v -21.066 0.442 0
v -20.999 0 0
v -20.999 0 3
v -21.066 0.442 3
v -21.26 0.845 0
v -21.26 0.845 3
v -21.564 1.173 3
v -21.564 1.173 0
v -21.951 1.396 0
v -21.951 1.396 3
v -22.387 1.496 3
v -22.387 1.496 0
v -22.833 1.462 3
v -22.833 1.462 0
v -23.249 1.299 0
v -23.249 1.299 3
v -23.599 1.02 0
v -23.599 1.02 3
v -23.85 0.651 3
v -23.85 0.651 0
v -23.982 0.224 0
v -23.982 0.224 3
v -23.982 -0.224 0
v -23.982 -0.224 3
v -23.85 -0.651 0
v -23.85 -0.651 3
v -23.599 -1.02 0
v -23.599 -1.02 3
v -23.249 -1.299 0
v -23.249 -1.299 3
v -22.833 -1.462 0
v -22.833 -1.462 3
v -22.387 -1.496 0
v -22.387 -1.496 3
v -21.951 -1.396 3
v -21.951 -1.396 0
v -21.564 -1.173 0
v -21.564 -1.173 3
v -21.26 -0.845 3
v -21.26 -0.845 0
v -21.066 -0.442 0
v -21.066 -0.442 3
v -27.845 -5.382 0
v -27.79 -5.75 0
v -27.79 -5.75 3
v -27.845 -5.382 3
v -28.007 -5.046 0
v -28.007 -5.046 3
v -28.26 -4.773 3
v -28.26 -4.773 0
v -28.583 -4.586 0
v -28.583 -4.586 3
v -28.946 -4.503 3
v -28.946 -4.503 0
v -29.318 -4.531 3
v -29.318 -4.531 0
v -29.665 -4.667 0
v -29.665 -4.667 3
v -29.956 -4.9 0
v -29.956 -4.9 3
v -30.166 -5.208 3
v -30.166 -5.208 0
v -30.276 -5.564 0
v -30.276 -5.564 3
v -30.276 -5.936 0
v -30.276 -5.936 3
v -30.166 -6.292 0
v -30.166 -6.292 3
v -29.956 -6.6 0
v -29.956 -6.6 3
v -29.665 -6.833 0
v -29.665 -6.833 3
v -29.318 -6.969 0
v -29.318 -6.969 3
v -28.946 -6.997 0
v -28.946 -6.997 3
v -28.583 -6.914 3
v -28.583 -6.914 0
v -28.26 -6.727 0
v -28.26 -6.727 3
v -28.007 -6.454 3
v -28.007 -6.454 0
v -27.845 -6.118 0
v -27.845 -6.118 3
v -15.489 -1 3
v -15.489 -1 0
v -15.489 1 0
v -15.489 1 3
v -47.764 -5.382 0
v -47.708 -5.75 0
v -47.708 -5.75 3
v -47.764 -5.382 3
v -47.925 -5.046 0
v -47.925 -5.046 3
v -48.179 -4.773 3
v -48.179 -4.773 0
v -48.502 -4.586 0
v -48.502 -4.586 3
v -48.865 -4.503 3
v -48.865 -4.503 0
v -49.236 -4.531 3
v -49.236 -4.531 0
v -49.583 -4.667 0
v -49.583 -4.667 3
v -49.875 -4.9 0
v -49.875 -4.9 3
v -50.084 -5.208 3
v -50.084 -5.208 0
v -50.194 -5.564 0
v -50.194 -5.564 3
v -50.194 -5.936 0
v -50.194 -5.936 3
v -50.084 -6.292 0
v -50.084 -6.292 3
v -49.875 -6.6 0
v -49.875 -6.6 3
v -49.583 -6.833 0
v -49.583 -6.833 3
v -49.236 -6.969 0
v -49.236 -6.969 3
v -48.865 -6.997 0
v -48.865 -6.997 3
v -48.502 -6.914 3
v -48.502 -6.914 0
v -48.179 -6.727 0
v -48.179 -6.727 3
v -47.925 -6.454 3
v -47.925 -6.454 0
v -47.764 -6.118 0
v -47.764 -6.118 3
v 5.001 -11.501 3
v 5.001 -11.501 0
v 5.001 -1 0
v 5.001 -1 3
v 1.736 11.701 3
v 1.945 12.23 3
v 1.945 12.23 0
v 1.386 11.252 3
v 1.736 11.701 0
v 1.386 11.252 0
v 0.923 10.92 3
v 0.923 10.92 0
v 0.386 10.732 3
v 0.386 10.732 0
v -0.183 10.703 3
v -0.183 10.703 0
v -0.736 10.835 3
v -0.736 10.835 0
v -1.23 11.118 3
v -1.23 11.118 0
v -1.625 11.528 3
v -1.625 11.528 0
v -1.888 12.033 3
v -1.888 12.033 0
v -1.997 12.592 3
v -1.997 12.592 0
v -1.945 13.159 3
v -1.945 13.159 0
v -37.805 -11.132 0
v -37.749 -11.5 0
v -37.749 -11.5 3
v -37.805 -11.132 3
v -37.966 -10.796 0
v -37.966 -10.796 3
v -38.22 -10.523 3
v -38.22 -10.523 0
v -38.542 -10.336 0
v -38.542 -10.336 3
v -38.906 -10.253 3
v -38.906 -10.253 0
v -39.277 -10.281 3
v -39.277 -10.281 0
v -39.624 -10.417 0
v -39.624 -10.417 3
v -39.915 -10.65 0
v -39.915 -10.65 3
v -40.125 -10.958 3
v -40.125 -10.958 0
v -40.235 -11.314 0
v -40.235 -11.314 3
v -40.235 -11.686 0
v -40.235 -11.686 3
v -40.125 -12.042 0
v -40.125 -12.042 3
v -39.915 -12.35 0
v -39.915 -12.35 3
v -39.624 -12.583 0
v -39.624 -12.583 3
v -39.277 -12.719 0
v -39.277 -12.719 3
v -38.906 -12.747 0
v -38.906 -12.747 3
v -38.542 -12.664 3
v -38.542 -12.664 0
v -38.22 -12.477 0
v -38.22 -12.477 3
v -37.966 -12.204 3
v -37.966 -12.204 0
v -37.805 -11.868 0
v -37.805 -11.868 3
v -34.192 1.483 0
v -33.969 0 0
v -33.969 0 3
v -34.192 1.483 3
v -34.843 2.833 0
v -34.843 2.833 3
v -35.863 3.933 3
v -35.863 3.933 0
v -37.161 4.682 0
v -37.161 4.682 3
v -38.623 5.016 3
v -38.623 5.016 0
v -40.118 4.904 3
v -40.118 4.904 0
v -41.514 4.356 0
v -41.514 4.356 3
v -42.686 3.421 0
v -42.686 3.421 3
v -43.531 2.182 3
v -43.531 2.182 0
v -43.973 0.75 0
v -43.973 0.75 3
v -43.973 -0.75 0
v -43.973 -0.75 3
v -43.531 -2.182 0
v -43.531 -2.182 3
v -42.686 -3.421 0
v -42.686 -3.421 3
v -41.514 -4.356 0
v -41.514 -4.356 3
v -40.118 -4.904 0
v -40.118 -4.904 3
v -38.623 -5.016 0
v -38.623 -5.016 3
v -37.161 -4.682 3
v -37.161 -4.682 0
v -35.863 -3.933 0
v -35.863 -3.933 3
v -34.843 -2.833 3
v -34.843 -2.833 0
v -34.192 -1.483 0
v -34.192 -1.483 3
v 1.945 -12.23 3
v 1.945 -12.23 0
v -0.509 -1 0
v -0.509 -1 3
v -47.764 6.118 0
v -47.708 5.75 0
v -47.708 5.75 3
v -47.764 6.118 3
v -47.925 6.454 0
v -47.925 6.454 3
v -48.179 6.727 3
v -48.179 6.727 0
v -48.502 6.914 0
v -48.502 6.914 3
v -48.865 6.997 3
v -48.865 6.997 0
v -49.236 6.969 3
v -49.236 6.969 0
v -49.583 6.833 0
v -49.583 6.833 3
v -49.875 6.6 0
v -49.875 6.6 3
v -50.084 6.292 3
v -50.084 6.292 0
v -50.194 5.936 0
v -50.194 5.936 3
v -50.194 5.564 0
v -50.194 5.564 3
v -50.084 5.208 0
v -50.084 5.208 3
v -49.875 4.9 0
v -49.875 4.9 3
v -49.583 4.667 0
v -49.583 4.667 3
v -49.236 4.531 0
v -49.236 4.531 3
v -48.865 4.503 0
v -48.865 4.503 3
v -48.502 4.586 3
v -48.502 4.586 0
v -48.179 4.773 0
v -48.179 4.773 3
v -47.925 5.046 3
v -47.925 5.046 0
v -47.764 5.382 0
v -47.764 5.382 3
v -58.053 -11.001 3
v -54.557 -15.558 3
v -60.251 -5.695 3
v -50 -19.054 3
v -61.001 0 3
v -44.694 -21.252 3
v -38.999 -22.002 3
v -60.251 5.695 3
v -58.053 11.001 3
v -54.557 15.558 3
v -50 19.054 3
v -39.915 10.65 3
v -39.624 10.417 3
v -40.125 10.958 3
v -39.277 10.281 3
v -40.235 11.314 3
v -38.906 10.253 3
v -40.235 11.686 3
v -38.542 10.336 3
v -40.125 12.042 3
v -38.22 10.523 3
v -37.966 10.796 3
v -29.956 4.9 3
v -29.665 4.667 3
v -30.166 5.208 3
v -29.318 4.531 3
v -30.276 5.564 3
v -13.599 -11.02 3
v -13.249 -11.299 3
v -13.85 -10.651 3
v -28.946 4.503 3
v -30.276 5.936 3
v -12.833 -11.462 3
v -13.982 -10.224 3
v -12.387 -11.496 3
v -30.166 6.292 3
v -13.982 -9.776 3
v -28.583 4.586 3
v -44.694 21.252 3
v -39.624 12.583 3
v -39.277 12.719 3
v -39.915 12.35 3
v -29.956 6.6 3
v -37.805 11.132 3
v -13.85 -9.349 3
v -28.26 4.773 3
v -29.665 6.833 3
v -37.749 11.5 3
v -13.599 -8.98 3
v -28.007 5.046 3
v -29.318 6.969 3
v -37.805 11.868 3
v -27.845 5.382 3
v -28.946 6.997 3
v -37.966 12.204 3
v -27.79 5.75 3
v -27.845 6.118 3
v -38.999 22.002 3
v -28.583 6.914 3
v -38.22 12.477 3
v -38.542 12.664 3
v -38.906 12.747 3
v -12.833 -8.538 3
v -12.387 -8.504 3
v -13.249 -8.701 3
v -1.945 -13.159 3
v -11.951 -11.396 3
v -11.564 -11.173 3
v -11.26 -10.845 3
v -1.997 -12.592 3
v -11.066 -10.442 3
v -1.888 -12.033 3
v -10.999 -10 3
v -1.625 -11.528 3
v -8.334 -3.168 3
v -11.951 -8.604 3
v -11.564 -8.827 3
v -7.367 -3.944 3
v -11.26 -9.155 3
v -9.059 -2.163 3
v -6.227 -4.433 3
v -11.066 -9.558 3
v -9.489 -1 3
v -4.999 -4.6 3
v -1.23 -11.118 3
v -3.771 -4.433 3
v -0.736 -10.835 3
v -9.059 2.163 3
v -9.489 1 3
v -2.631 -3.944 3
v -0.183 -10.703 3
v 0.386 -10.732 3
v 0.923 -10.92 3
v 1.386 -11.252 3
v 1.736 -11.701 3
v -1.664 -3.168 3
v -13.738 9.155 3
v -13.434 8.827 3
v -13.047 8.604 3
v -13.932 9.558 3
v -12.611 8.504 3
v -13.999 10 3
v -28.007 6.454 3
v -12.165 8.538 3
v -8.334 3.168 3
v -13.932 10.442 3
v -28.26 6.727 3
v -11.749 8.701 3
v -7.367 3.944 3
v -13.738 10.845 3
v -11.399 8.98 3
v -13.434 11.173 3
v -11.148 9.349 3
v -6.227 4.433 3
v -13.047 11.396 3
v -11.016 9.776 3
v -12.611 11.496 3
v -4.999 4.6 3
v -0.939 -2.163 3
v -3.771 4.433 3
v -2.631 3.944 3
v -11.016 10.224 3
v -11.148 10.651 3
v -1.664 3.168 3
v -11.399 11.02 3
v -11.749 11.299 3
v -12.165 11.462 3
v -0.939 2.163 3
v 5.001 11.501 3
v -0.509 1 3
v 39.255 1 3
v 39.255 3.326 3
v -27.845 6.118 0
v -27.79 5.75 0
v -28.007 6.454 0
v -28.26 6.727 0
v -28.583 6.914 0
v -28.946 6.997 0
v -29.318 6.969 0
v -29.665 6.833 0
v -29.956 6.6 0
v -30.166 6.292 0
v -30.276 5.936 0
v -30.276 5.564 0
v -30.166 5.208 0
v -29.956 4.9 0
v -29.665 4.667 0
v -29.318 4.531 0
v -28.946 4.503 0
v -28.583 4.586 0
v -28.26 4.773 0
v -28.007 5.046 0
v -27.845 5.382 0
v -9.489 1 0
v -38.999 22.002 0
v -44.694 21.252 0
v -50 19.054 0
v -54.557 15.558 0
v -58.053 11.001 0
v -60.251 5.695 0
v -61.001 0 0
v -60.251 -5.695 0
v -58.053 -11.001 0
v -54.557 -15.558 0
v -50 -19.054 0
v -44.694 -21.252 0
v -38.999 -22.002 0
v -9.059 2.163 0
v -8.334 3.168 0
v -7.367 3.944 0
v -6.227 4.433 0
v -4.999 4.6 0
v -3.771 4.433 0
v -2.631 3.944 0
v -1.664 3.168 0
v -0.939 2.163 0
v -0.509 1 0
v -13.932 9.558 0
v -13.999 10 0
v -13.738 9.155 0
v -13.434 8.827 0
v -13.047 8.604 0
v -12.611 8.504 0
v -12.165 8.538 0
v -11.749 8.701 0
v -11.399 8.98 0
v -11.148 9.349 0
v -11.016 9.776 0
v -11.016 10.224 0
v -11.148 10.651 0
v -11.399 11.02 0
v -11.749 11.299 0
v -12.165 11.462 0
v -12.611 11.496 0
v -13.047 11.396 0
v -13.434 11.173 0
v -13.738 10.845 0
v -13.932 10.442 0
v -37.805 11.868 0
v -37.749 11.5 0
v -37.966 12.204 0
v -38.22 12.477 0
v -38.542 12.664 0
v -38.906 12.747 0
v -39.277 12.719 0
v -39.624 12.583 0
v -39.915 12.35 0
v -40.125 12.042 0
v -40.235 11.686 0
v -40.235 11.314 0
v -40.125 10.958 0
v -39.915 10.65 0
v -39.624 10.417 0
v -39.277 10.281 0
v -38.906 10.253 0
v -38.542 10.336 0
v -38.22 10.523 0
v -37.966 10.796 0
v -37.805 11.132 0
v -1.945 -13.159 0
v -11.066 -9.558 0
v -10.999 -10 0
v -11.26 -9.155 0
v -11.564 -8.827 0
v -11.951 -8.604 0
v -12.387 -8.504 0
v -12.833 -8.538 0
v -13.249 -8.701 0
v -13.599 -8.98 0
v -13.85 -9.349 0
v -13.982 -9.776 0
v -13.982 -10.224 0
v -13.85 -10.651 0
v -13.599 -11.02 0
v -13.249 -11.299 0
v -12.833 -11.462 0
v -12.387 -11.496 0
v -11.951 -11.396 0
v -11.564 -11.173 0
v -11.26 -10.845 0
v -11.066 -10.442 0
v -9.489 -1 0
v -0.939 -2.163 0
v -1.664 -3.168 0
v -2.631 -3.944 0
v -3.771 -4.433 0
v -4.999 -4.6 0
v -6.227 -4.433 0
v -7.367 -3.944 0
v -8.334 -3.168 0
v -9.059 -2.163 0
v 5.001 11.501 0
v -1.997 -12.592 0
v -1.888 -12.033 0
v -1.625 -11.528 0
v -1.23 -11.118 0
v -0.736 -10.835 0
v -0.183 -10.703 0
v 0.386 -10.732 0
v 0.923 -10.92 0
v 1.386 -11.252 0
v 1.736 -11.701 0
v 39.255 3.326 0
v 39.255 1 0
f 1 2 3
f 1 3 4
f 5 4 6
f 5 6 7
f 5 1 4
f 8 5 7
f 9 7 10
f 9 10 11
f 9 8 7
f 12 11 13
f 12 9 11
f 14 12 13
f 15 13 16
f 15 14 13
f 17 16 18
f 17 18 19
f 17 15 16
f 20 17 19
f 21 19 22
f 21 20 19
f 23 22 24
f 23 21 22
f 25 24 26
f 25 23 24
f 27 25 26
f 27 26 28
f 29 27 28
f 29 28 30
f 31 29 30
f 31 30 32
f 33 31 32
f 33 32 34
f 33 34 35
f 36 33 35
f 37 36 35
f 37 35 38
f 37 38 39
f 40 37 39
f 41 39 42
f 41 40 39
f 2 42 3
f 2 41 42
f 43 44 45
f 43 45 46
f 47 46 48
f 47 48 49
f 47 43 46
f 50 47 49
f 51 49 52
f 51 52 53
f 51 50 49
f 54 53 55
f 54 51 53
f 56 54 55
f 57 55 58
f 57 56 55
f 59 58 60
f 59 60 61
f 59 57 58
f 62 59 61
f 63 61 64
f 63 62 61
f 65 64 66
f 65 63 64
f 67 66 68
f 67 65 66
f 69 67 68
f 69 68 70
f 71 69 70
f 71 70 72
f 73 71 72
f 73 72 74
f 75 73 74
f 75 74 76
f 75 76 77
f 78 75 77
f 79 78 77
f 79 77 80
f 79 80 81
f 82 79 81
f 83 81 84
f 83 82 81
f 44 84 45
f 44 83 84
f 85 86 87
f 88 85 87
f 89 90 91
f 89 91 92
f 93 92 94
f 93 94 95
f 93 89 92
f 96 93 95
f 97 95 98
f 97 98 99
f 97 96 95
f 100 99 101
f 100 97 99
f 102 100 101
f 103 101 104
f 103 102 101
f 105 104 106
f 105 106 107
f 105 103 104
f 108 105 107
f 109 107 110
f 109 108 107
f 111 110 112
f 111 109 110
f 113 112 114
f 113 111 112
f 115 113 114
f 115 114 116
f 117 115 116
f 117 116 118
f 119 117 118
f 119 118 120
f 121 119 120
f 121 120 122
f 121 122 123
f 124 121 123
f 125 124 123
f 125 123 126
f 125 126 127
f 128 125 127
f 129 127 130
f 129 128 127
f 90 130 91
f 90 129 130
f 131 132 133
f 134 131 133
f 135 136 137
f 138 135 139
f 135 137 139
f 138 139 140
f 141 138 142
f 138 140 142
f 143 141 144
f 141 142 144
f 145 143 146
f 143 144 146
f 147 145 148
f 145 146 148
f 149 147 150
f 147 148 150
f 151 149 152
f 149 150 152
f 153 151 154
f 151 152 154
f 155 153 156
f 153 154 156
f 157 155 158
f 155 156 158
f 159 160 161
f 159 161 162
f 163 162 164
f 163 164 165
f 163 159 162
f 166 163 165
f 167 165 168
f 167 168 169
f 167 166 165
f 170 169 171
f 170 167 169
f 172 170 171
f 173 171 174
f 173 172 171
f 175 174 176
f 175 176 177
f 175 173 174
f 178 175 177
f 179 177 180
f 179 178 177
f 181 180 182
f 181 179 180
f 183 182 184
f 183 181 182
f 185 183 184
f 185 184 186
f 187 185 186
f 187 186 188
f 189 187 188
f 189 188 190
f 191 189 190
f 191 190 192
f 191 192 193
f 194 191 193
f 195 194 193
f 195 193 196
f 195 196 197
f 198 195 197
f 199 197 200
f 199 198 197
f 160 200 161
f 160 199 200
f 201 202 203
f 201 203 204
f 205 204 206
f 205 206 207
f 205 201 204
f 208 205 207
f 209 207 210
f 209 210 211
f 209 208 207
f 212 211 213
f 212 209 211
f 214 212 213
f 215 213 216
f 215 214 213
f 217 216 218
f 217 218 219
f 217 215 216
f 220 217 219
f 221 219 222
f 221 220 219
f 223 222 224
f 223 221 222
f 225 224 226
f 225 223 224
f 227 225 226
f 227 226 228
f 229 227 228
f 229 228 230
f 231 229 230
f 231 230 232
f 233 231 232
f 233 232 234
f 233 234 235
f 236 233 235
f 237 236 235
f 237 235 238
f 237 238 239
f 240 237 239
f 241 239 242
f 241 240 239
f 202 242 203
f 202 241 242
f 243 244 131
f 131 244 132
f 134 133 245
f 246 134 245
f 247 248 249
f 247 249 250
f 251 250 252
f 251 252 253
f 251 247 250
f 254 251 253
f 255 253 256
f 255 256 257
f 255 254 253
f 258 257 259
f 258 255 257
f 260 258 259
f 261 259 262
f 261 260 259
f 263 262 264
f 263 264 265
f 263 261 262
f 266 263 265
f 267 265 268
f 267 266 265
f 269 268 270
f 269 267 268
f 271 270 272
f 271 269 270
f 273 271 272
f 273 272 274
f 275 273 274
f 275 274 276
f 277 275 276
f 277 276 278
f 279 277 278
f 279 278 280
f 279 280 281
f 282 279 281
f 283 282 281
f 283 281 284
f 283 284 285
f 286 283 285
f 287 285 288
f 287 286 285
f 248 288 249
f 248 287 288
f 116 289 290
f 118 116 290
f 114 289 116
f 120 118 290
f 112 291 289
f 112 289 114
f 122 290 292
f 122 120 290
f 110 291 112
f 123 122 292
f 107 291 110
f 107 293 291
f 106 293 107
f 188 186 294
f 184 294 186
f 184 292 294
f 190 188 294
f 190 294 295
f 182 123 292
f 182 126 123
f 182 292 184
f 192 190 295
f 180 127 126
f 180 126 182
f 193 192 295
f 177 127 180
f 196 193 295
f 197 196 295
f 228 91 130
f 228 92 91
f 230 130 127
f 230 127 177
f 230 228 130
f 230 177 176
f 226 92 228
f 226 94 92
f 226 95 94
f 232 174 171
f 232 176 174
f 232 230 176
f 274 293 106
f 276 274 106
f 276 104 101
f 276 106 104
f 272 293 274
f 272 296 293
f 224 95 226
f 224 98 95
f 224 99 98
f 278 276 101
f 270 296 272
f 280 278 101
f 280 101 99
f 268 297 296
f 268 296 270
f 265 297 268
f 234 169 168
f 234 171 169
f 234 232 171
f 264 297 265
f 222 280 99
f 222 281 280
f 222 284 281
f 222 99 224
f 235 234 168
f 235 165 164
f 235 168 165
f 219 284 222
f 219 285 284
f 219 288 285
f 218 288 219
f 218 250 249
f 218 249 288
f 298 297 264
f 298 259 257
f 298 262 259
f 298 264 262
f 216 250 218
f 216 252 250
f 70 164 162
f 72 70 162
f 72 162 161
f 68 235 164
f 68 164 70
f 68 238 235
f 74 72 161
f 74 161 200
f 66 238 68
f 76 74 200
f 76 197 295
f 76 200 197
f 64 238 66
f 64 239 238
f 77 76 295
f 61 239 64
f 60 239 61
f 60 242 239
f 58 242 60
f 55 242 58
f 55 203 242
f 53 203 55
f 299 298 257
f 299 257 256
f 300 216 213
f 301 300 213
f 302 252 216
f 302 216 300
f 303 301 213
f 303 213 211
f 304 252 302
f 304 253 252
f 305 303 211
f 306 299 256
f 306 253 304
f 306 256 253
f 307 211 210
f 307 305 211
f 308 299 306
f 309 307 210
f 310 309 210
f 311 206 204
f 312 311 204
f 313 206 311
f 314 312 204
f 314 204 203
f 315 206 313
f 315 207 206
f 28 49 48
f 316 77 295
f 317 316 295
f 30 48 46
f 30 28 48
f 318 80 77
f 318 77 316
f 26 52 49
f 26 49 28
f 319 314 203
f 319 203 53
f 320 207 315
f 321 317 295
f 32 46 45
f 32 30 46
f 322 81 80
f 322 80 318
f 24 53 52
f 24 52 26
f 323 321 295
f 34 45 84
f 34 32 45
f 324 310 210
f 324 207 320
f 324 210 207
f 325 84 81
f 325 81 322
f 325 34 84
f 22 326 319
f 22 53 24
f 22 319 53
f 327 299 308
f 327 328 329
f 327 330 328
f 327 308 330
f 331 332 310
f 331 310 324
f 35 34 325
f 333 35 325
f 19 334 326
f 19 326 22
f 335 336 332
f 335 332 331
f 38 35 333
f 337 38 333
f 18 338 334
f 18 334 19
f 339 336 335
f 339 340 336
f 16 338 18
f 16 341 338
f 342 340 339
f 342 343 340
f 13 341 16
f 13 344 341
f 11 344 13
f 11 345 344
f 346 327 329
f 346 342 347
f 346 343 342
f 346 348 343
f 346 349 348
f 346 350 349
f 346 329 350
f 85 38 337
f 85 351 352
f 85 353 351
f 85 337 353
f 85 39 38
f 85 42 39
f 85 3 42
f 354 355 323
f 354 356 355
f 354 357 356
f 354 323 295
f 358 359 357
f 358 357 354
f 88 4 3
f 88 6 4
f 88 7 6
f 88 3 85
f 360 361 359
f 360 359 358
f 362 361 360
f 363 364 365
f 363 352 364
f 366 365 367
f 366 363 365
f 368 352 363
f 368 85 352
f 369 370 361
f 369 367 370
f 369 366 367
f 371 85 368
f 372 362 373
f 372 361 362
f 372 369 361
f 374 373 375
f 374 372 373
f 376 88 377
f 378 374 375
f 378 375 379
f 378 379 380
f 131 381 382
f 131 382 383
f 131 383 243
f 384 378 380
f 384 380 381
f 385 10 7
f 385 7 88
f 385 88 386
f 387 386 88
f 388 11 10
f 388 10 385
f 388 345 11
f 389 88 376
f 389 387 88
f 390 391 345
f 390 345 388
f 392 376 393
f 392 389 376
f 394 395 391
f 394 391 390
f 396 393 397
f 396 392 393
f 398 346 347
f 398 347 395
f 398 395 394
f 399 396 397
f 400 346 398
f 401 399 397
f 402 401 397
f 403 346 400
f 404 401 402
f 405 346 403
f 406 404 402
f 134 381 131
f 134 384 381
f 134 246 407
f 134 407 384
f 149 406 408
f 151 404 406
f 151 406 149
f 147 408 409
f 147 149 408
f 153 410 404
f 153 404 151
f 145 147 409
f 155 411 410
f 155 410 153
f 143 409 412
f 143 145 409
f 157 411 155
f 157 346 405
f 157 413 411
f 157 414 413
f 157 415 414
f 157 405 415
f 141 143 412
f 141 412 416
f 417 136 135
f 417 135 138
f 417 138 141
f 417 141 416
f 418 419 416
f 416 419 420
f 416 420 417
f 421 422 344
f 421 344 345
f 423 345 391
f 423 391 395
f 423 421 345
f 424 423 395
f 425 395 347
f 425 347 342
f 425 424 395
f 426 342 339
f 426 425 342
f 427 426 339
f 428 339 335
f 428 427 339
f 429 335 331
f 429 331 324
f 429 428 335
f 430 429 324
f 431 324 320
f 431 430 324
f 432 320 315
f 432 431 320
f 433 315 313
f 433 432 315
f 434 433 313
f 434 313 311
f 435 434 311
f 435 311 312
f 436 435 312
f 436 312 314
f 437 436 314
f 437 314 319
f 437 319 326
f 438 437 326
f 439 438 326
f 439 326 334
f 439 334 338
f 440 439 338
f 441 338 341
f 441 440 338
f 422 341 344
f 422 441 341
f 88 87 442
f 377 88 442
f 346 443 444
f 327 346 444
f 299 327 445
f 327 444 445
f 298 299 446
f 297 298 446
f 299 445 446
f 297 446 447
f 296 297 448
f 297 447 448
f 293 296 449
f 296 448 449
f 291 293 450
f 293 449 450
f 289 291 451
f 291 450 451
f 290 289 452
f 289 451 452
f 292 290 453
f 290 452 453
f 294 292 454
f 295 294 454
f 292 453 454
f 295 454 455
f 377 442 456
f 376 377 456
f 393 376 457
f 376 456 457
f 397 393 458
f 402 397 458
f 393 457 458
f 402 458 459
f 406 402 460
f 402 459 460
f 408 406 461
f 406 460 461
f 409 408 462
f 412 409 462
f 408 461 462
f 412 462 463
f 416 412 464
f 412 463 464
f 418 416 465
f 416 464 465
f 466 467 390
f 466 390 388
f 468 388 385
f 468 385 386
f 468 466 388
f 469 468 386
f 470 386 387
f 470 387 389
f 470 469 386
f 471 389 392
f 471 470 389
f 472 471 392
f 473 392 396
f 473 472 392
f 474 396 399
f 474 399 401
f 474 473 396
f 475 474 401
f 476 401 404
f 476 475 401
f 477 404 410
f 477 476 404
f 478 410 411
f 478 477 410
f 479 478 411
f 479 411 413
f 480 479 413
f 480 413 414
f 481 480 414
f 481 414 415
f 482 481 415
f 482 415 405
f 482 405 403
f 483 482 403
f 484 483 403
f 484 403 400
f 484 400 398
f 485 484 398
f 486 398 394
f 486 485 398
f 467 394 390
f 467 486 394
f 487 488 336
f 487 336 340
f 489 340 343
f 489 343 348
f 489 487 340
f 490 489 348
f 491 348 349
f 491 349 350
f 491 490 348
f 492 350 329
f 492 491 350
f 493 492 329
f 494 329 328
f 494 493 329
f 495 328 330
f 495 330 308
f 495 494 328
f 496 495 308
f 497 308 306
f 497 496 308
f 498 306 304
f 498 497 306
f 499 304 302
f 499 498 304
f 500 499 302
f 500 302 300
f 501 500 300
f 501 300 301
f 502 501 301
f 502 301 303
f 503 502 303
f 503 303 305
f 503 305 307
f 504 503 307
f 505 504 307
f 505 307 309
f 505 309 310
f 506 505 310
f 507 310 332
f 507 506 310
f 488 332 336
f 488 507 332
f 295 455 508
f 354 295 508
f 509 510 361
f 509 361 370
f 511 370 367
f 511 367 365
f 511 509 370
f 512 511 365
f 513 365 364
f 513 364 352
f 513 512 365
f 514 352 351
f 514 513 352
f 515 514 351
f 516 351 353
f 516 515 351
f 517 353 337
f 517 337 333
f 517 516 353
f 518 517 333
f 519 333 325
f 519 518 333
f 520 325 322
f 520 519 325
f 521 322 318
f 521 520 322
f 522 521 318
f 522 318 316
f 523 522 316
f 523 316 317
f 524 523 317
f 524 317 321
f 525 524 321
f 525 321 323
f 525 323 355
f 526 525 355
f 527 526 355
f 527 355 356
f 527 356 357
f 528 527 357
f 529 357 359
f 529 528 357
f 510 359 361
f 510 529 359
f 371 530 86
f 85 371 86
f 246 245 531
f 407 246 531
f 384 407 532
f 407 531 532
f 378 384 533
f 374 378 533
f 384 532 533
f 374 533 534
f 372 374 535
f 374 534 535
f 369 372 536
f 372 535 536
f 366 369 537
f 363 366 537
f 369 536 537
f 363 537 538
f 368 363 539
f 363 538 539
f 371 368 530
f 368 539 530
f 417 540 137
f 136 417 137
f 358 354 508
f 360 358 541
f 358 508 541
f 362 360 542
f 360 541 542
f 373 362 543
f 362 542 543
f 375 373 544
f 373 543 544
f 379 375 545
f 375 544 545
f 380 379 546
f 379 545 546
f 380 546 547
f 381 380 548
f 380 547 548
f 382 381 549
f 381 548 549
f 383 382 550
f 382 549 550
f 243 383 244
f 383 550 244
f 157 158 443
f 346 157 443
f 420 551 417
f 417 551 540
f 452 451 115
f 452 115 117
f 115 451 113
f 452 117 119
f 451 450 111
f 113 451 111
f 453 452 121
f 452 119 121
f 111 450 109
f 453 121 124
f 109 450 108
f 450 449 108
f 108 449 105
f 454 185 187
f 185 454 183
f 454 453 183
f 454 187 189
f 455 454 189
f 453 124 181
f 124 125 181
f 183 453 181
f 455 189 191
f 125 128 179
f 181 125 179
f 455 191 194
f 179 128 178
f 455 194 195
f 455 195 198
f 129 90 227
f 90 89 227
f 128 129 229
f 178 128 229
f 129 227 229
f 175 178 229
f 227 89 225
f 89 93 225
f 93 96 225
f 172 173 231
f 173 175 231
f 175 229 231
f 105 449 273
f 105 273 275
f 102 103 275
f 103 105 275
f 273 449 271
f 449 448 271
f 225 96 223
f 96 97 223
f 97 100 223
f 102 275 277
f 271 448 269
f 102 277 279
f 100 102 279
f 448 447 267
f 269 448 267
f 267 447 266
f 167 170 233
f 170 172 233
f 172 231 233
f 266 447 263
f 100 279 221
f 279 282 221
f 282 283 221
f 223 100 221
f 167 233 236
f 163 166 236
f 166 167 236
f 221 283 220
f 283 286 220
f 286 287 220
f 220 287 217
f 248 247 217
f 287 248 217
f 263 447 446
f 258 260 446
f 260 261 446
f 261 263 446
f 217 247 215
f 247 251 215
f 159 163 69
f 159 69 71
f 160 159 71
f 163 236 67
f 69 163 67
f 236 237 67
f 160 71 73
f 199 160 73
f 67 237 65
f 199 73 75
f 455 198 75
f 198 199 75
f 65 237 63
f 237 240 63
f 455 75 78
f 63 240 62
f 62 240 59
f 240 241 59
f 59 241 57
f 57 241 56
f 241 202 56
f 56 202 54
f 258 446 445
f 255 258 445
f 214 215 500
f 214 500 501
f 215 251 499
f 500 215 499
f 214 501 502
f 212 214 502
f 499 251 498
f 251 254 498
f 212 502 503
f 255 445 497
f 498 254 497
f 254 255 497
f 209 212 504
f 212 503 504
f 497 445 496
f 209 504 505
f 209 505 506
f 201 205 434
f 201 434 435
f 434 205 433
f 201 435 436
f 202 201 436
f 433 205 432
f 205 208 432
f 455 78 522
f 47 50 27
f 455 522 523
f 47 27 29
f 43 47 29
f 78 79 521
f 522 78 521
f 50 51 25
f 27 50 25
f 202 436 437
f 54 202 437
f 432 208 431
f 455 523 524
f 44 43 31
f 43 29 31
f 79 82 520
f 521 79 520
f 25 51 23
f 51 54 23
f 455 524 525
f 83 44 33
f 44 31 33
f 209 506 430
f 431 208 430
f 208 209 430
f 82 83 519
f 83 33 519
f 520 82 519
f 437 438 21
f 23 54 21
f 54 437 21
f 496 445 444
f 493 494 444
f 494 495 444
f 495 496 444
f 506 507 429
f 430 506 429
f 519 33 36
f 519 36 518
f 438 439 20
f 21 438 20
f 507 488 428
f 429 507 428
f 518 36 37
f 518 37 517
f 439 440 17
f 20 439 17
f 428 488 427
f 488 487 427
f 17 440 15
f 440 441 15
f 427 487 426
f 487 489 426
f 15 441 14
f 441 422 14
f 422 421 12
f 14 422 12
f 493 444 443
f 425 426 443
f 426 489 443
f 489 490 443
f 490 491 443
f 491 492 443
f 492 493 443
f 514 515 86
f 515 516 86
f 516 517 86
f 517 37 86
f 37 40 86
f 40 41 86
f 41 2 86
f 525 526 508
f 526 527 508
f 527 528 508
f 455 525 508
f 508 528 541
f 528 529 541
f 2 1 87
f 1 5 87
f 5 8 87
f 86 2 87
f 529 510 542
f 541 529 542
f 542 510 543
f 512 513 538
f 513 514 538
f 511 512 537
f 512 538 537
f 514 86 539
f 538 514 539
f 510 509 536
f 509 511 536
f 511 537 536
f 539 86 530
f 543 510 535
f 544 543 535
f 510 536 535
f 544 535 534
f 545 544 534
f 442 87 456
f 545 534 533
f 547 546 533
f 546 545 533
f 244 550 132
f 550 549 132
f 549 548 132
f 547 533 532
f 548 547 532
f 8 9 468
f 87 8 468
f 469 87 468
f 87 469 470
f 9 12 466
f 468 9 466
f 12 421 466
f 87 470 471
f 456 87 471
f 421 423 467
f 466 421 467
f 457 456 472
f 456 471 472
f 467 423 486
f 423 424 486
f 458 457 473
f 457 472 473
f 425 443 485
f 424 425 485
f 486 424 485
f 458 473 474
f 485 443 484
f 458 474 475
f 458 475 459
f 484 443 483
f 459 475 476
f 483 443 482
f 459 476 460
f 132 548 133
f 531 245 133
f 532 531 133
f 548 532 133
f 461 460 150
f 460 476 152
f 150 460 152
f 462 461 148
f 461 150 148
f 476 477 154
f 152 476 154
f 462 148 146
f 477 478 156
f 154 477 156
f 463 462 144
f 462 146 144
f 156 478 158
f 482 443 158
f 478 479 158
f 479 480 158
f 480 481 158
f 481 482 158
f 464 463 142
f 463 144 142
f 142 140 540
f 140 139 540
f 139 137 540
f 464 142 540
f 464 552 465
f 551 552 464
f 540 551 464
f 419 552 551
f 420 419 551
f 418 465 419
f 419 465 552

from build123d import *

# Parameters (mm, degrees)
SKETCH_1_R          = 5.03
SKETCH_1_R_2        = 1.25
SKETCH_1_R_3        = 1.5
EXTRUDE_1_DEPTH     = 3
SKETCH_2_R          = 2
CUT_EXTRUDE_1_DEPTH = 4


with BuildPart() as part:
    # 草图1 → 凸台-拉伸1 (new body)
    with BuildSketch(Plane.XY):
        with BuildLine():
            Line((-15.488984032, 1), (-9.488984032, 1))
            ThreePointArc((-9.488984032, 1), (-4.998995168, 4.6), (-0.509006304, 1))
            Line((-0.509006304, 1), (5.001004832, 1))
            Line((5.001004832, 1), (39.254812875, 1))
            Line((39.254812875, 1), (39.254812875, 3.326018382))
            Line((39.254812875, 3.326018382), (5.001004832, 11.501004832))
            Line((5.001004832, 11.501004832), (-38.998995168, 22.002009663))
            ThreePointArc((-38.998995168, 22.002009663), (-61.001004832, 0), (-38.998995168, -22.002009663))
            Line((-38.998995168, -22.002009663), (5.001004832, -11.501004832))
            Line((5.001004832, -11.501004832), (5.001004832, -1))
            Line((5.001004832, -1), (-0.509006304, -1))
            ThreePointArc((-0.509006304, -1), (-4.998995168, -4.6), (-9.488984032, -1))
            Line((-9.488984032, -1), (-15.488984032, -1))
            Line((-15.488984032, -1), (-15.488984032, 1))
        make_face()
        with Locations((-38.998995168, 0)):
            Circle(SKETCH_1_R, mode=Mode.SUBTRACT)
        with Locations((-38.998995168, -11.5)):
            Circle(SKETCH_1_R_2, mode=Mode.SUBTRACT)
        with Locations((-12.498995168, -10)):
            Circle(SKETCH_1_R_3, mode=Mode.SUBTRACT)
        with Locations((-22.498995168, 0)):
            Circle(SKETCH_1_R_3, mode=Mode.SUBTRACT)
        with Locations((-48.958287312, -5.75)):
            Circle(SKETCH_1_R_2, mode=Mode.SUBTRACT)
        with Locations(Location((-12.498995168, 10, 0), (0, 0, 180))):
            Circle(SKETCH_1_R_3, mode=Mode.SUBTRACT)
        with Locations((-48.958287312, 5.75)):
            Circle(SKETCH_1_R_2, mode=Mode.SUBTRACT)
        with Locations((-38.998995168, 11.5)):
            Circle(SKETCH_1_R_2, mode=Mode.SUBTRACT)
        with Locations((-29.039703025, 5.75)):
            Circle(SKETCH_1_R_2, mode=Mode.SUBTRACT)
        with Locations((-29.039703025, -5.75)):
            Circle(SKETCH_1_R_2, mode=Mode.SUBTRACT)
    extrude(amount=EXTRUDE_1_DEPTH)

    # 草图2 → 切除-拉伸1 (cut)
    with BuildSketch(Plane(origin=(0, 0, 0), x_dir=(-1, 0, 0), z_dir=(0, 0, -1))):
        with Locations((0, 12.694540648)):
            Circle(SKETCH_2_R)
        with Locations((0, -12.694540648)):
            Circle(SKETCH_2_R)
    extrude(amount=-CUT_EXTRUDE_1_DEPTH, mode=Mode.SUBTRACT)


solid = part.part
